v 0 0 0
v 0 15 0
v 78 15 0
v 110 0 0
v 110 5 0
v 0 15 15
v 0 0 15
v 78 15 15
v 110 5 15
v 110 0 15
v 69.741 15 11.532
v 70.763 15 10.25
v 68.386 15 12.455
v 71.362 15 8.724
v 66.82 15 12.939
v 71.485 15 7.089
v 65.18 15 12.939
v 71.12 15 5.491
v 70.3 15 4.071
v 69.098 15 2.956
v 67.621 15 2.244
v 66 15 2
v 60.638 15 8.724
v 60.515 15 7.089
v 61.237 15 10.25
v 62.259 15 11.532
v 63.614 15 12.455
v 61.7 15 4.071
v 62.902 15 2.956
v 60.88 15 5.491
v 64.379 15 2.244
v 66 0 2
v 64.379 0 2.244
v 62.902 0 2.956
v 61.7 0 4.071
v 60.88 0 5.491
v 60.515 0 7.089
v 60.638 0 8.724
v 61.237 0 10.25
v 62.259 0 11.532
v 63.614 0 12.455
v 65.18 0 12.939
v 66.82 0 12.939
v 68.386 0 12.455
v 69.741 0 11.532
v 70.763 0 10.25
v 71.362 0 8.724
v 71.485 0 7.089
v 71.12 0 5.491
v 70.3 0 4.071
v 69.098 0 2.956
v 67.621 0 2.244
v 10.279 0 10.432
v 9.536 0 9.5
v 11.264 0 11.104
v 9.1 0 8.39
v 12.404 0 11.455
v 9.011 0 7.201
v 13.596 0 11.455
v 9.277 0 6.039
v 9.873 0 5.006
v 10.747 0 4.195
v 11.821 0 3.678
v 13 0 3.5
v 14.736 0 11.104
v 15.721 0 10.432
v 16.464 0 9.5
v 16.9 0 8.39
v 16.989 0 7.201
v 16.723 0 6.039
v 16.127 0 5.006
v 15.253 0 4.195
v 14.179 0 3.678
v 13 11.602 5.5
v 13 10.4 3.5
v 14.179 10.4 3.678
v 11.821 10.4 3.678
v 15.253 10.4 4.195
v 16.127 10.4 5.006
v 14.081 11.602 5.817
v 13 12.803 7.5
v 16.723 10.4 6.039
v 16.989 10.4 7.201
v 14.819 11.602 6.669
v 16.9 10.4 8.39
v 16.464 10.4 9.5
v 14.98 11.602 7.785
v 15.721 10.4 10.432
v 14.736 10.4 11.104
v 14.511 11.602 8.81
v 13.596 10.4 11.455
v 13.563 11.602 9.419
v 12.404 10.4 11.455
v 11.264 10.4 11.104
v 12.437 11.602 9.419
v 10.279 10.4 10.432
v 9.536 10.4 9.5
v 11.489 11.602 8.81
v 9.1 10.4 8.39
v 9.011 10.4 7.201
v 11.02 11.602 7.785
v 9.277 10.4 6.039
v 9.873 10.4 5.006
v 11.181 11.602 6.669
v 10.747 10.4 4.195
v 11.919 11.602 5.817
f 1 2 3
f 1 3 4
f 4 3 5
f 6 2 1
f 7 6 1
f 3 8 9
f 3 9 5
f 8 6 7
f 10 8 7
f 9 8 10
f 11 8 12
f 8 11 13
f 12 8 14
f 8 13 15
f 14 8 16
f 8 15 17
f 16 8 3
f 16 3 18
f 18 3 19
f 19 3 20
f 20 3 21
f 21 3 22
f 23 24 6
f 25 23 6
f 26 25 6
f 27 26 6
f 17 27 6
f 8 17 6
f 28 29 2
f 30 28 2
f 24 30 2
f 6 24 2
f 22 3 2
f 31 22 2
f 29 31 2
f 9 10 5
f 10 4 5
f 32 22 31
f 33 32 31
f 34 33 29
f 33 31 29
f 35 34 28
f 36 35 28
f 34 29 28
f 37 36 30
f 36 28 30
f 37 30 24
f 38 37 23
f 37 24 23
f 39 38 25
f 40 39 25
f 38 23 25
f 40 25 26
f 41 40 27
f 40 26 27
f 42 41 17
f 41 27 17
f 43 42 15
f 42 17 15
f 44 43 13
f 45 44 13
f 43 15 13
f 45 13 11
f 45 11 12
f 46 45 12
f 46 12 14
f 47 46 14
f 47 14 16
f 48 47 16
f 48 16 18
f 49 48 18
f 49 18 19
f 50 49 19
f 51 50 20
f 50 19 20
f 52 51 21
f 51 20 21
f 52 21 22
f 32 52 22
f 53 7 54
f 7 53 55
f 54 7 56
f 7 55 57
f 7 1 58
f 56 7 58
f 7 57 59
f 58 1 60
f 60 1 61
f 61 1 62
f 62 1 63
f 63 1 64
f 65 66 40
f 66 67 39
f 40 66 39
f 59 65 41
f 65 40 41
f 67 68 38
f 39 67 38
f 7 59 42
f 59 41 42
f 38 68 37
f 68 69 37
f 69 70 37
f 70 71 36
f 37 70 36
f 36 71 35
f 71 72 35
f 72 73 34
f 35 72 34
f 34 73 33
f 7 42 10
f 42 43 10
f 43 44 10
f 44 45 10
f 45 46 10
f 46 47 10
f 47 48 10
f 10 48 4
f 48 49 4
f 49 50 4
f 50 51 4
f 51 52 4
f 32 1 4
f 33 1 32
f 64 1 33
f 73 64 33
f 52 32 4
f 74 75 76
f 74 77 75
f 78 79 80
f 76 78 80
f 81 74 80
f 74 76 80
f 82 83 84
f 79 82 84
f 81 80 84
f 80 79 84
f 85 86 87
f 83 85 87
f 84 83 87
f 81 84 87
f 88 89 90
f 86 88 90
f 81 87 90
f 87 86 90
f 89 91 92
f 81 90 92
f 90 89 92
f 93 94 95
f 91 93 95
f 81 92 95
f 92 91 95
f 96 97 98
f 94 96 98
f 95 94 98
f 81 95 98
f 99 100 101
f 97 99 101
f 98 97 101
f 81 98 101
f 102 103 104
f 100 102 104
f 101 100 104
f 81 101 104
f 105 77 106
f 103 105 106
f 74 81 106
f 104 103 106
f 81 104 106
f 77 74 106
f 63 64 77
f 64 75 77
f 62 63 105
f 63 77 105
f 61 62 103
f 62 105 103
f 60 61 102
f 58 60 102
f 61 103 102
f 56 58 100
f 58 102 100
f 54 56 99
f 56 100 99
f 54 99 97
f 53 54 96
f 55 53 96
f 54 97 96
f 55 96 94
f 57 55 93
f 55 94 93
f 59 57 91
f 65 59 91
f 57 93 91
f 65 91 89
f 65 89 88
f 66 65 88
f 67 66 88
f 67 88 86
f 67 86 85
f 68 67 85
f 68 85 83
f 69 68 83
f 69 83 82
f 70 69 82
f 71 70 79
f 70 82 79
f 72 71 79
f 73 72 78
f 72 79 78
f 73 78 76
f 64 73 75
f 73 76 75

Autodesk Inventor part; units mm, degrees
ref_plane "YZ Plane" through (0, 0, 0) normal (1, 0, 0) x (0, 1, 0)
ref_plane "XZ Plane" through (0, 0, 0) normal (0, 1, 0) x (-1, 0, 0)
ref_plane "XY Plane" through (0, 0, 0) normal (0, 0, 1) x (1, 0, 0)
sketch "Esboço1" plane through (0, 0, 0) normal (0, 0, 1) x (1, 0, 0)
  line L0 (0, 0) -> (110, 0)
  line L1 (110, 0) -> (110, 15)
  line L2 (110, 15) -> (0, 15)
  line L3 (0, 15) -> (0, 0)
  dimension "d0" = 110
  dimension "d1" = 15
extrude "Extrusão1" add sketch "Esboço1" along normal blind 15
chamfer "Chanfro1" distance 10 distance2 32 1 edges at (110, 15, 7.5) measured on face at (110, 5, 5)
sketch "Esboço2" plane through (0, 0, 0) normal (0, -1, 0) x (1, 0, 0)
  line L0 (0, 15) -> (110, 15) projected
  line L1 (0, 0) -> (0, 15) projected
  point P0 (13, 7.5)
  dimension "d7" = 7.5
  dimension "d8" = 13
hole "Furo1" at (13, 0, 7.5) direction (0, 1, 0) diameter 8 depth 10.4 tip angle 118
sketch "Esboço3" plane through (0, 0, 0) normal (0, -1, 0) x (1, 0, 0)
  point P0 (0, 0)
sketch "Esboço4" plane through (0, 0, 0) normal (0, -1, 0) x (1, 0, 0)
  circle A0 centre (13, 7.5) radius 4 projected
  point P0 (0, 0)
  point P1 (66, 7.5)
  dimension "d17" = 53
hole "Furo2" at (66, 0, 7.5) direction (0, 1, 0) diameter 11 end through all
properties part number "Garra1"
